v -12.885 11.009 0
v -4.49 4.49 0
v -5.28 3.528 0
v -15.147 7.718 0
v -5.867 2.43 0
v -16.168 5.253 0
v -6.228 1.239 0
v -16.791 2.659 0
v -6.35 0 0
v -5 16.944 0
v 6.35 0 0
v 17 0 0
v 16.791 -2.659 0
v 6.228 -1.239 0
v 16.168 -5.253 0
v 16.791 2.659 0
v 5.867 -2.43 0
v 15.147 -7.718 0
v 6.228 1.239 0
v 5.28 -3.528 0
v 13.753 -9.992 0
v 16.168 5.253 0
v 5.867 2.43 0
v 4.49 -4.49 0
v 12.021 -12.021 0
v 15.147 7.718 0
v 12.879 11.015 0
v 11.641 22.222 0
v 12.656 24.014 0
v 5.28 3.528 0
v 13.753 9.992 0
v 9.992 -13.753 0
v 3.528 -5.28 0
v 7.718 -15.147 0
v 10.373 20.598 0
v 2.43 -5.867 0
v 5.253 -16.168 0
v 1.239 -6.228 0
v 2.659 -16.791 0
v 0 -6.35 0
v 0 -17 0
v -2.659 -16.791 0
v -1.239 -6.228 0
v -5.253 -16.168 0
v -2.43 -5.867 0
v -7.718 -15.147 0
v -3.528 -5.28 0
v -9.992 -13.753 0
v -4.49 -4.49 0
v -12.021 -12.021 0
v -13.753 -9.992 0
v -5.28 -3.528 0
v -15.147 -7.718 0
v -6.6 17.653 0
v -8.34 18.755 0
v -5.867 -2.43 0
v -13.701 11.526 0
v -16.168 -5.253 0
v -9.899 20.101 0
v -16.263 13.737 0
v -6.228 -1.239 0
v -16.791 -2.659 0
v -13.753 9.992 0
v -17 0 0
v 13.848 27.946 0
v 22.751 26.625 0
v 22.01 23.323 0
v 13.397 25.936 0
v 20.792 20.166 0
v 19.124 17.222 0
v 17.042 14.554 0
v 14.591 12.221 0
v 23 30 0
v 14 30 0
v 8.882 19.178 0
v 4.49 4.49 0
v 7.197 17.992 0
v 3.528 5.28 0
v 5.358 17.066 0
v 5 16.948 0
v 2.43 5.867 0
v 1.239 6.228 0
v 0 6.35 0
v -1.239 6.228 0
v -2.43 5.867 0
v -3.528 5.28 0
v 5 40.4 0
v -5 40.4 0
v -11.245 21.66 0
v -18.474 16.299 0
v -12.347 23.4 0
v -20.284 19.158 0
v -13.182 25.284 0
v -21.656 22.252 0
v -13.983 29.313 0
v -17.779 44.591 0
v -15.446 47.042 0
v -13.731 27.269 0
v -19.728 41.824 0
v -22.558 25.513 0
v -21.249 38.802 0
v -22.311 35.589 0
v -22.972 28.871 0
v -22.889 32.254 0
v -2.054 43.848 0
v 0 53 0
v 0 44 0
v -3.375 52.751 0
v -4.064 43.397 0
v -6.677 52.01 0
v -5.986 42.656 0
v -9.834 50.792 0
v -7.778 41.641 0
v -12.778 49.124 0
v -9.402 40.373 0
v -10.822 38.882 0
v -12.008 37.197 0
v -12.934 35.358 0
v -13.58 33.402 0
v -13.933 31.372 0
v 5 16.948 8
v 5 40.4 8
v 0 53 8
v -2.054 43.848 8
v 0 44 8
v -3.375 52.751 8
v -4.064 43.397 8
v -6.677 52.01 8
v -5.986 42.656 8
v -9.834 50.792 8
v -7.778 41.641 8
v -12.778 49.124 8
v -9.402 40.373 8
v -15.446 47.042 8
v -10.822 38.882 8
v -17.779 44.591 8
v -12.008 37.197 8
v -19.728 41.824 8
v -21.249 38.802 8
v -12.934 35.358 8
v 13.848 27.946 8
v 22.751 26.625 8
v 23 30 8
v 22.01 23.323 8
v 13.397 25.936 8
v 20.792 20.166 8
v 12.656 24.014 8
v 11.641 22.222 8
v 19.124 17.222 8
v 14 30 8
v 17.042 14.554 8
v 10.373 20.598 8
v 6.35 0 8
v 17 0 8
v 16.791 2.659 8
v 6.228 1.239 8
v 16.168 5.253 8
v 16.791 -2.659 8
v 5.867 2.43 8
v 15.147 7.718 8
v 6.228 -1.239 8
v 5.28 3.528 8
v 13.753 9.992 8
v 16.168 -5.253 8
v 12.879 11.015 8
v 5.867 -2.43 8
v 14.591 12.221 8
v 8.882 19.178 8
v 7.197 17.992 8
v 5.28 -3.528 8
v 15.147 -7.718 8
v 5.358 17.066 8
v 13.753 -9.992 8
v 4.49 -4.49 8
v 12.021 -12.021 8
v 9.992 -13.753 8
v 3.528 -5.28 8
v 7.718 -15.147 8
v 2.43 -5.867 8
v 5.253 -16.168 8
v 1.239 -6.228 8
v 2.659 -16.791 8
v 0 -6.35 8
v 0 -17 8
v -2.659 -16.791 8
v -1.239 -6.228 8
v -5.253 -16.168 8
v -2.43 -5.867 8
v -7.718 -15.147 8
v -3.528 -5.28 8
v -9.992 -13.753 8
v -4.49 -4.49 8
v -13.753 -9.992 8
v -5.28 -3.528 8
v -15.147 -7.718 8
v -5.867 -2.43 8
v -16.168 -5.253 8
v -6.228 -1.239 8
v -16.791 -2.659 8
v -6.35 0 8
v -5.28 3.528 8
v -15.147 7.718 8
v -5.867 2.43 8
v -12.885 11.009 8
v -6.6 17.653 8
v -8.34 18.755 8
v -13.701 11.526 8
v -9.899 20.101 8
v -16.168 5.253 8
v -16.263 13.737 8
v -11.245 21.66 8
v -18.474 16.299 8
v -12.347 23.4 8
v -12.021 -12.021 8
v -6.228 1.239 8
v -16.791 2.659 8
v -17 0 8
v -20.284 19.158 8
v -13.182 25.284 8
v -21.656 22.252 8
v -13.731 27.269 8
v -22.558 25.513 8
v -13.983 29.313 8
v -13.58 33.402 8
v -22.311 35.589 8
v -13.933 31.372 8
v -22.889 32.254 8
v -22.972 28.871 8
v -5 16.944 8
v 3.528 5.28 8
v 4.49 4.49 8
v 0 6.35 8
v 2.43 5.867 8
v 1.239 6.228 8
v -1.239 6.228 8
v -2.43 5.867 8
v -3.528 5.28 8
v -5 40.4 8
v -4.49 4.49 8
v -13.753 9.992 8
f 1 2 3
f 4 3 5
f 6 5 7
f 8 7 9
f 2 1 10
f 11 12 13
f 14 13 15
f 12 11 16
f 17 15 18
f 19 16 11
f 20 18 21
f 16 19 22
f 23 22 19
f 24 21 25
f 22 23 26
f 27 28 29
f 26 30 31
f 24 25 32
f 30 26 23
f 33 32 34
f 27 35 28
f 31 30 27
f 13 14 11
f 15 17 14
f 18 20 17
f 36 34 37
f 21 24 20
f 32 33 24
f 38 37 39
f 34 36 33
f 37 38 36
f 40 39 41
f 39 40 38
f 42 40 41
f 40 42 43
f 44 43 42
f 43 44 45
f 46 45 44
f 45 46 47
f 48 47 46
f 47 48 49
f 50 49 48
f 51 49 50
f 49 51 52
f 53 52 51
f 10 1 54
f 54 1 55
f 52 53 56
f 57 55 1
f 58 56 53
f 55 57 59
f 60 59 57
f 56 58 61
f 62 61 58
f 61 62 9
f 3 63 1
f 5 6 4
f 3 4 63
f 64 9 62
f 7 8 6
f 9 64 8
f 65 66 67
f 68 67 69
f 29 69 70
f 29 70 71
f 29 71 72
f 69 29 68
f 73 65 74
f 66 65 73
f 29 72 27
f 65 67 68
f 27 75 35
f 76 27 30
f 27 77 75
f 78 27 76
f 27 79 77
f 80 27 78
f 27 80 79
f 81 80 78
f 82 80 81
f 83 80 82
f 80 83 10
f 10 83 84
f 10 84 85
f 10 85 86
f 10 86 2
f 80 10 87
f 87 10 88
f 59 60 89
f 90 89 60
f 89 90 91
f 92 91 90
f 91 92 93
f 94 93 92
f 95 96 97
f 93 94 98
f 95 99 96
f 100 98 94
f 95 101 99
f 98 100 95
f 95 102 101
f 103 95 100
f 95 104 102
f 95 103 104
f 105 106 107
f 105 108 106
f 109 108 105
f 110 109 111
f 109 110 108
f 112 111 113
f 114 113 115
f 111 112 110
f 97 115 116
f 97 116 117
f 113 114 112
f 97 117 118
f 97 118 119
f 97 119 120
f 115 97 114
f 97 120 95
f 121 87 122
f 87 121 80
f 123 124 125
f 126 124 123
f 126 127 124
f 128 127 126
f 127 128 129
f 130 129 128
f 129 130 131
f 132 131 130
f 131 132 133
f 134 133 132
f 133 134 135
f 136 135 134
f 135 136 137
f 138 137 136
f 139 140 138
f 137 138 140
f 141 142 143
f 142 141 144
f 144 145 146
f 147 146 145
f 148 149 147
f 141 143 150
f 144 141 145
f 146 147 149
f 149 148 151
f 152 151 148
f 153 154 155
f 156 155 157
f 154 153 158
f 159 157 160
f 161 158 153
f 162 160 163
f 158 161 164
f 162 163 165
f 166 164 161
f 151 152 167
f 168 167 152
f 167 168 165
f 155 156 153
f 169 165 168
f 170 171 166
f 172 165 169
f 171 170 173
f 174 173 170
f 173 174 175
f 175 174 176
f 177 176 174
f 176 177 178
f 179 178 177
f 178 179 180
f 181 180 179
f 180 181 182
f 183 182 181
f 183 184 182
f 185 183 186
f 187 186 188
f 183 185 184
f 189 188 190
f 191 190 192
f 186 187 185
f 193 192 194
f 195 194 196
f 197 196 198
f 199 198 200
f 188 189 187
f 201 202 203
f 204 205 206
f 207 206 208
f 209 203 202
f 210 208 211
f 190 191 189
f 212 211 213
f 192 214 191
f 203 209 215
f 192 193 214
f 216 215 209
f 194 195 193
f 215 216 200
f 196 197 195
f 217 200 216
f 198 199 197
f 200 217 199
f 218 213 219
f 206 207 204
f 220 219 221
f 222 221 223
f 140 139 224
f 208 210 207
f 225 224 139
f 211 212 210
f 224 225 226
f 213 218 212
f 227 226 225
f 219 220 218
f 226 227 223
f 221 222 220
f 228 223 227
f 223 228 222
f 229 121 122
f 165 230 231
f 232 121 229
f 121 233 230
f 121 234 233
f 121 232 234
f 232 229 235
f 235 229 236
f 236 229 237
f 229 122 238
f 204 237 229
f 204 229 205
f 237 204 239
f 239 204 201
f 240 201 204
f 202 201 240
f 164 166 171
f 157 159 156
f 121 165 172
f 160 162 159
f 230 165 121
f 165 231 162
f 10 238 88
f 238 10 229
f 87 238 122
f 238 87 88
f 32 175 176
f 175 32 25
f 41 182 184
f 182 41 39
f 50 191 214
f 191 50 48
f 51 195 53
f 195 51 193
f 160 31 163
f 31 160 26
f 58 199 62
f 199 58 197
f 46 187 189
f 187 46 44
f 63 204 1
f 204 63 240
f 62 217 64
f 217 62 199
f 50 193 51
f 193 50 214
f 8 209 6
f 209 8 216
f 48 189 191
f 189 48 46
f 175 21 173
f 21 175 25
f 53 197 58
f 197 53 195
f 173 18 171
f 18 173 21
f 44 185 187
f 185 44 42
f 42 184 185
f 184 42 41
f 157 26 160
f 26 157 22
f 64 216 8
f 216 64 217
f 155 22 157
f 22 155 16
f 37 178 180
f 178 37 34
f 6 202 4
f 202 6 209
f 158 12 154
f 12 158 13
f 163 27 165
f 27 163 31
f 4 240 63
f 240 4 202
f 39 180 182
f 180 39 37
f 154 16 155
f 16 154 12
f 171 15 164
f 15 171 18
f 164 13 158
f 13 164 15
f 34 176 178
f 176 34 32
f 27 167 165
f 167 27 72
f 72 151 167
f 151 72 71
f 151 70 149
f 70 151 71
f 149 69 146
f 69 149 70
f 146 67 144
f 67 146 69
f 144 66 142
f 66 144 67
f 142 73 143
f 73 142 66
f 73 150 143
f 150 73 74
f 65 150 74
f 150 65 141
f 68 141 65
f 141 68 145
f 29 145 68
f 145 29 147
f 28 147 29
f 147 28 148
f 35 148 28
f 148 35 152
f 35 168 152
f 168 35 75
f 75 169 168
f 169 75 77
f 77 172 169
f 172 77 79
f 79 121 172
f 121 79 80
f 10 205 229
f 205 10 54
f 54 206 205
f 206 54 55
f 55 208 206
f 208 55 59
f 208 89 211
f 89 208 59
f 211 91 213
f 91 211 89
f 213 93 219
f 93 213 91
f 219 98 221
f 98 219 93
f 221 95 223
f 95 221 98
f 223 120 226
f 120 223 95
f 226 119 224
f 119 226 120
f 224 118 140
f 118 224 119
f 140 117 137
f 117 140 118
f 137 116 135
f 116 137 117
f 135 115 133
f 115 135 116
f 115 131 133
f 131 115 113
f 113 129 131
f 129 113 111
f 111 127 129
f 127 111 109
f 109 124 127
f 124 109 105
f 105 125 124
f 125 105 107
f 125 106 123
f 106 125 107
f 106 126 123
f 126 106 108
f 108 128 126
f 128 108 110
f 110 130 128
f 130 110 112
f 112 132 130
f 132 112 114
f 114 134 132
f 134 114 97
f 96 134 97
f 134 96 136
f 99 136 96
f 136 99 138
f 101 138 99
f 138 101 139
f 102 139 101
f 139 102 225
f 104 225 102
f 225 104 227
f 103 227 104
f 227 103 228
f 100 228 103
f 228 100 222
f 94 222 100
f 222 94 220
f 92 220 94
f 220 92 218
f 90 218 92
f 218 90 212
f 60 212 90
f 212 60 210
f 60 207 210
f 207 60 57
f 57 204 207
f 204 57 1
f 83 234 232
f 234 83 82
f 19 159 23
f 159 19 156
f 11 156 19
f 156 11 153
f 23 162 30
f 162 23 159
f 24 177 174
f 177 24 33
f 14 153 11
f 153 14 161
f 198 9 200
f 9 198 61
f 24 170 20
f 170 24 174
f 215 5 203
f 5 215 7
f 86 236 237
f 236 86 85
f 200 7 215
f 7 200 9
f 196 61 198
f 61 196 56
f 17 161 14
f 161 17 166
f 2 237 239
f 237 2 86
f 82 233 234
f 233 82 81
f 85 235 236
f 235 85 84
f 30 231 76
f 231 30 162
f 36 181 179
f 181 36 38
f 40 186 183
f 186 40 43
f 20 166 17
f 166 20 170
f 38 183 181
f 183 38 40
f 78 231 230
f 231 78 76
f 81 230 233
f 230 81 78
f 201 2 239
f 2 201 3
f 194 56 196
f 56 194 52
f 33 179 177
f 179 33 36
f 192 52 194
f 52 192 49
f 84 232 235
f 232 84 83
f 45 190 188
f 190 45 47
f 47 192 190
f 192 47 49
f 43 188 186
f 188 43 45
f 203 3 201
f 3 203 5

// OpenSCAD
$fn = 32;

// ----------------------------------------------------------------------
// Hook: 60 mm shank into a 14 mm curl, 8 mm thick
// ----------------------------------------------------------------------

// --- parameters (mm) ---
shank_len = 60;           // shank length from the boss centre
shank_w = 10;             // shank width
boss_d = 34;              // boss diameter
bore_d = 12.7;            // boss bore
curl_in = 14;             // curl inner radius
curl_out = 23;            // curl outer radius
curl_sweep = 270;         // curl sweep angle
hook_t = 8;               // hook thickness

shank_profile = [[-5, 40.4], [5, 40.4], [5, 15], [-5, 15]];
boss_profile = [[17, 0], [16.791, 2.659], [16.168, 5.253], [15.147, 7.718], [13.753, 9.992], [12.021, 12.021], [9.992, 13.753], [7.718, 15.147], [5.253, 16.168], [2.659, 16.791], [0, 17], [-2.659, 16.791], [-5.253, 16.168], [-7.718, 15.147], [-9.992, 13.753], [-12.021, 12.021], [-13.753, 9.992], [-15.147, 7.718], [-16.168, 5.253], [-16.791, 2.659], [-17, 0], [-16.791, -2.659], [-16.168, -5.253], [-15.147, -7.718], [-13.753, -9.992], [-12.021, -12.021], [-9.992, -13.753], [-7.718, -15.147], [-5.253, -16.168], [-2.659, -16.791], [0, -17], [2.659, -16.791], [5.253, -16.168], [7.718, -15.147], [9.992, -13.753], [12.021, -12.021], [13.753, -9.992], [15.147, -7.718], [16.168, -5.253], [16.791, -2.659]];
curl_profile = [[0, 53], [-3.375, 52.751], [-6.677, 52.01], [-9.834, 50.792], [-12.778, 49.124], [-15.446, 47.042], [-17.779, 44.591], [-19.728, 41.824], [-21.249, 38.802], [-22.311, 35.589], [-22.889, 32.254], [-22.972, 28.871], [-22.558, 25.513], [-21.656, 22.252], [-20.284, 19.158], [-18.474, 16.299], [-16.263, 13.737], [-13.701, 11.526], [-10.842, 9.716], [-7.748, 8.344], [-4.487, 7.442], [-1.129, 7.028], [2.254, 7.111], [5.589, 7.689], [8.802, 8.751], [11.824, 10.272], [14.591, 12.221], [17.042, 14.554], [19.124, 17.222], [20.792, 20.166], [22.01, 23.323], [22.751, 26.625], [23, 30], [14, 30], [13.848, 27.946], [13.397, 25.936], [12.656, 24.014], [11.641, 22.222], [10.373, 20.598], [8.882, 19.178], [7.197, 17.992], [5.358, 17.066], [3.402, 16.42], [1.372, 16.067], [-0.687, 16.017], [-2.731, 16.269], [-4.716, 16.818], [-6.6, 17.653], [-8.34, 18.755], [-9.899, 20.101], [-11.245, 21.66], [-12.347, 23.4], [-13.182, 25.284], [-13.731, 27.269], [-13.983, 29.313], [-13.933, 31.372], [-13.58, 33.402], [-12.934, 35.358], [-12.008, 37.197], [-10.822, 38.882], [-9.402, 40.373], [-7.778, 41.641], [-5.986, 42.656], [-4.064, 43.397], [-2.054, 43.848], [0, 44]];

difference() {
  union() {
    /* three overlapping outlines: shank, boss and the smooth curl */
    linear_extrude(height = hook_t) polygon(shank_profile);
    linear_extrude(height = hook_t) polygon(boss_profile);
    linear_extrude(height = hook_t) polygon(curl_profile);
  }
  translate([0, 0, -2.5]) cylinder(h = hook_t + 5, d = bore_d);
}
